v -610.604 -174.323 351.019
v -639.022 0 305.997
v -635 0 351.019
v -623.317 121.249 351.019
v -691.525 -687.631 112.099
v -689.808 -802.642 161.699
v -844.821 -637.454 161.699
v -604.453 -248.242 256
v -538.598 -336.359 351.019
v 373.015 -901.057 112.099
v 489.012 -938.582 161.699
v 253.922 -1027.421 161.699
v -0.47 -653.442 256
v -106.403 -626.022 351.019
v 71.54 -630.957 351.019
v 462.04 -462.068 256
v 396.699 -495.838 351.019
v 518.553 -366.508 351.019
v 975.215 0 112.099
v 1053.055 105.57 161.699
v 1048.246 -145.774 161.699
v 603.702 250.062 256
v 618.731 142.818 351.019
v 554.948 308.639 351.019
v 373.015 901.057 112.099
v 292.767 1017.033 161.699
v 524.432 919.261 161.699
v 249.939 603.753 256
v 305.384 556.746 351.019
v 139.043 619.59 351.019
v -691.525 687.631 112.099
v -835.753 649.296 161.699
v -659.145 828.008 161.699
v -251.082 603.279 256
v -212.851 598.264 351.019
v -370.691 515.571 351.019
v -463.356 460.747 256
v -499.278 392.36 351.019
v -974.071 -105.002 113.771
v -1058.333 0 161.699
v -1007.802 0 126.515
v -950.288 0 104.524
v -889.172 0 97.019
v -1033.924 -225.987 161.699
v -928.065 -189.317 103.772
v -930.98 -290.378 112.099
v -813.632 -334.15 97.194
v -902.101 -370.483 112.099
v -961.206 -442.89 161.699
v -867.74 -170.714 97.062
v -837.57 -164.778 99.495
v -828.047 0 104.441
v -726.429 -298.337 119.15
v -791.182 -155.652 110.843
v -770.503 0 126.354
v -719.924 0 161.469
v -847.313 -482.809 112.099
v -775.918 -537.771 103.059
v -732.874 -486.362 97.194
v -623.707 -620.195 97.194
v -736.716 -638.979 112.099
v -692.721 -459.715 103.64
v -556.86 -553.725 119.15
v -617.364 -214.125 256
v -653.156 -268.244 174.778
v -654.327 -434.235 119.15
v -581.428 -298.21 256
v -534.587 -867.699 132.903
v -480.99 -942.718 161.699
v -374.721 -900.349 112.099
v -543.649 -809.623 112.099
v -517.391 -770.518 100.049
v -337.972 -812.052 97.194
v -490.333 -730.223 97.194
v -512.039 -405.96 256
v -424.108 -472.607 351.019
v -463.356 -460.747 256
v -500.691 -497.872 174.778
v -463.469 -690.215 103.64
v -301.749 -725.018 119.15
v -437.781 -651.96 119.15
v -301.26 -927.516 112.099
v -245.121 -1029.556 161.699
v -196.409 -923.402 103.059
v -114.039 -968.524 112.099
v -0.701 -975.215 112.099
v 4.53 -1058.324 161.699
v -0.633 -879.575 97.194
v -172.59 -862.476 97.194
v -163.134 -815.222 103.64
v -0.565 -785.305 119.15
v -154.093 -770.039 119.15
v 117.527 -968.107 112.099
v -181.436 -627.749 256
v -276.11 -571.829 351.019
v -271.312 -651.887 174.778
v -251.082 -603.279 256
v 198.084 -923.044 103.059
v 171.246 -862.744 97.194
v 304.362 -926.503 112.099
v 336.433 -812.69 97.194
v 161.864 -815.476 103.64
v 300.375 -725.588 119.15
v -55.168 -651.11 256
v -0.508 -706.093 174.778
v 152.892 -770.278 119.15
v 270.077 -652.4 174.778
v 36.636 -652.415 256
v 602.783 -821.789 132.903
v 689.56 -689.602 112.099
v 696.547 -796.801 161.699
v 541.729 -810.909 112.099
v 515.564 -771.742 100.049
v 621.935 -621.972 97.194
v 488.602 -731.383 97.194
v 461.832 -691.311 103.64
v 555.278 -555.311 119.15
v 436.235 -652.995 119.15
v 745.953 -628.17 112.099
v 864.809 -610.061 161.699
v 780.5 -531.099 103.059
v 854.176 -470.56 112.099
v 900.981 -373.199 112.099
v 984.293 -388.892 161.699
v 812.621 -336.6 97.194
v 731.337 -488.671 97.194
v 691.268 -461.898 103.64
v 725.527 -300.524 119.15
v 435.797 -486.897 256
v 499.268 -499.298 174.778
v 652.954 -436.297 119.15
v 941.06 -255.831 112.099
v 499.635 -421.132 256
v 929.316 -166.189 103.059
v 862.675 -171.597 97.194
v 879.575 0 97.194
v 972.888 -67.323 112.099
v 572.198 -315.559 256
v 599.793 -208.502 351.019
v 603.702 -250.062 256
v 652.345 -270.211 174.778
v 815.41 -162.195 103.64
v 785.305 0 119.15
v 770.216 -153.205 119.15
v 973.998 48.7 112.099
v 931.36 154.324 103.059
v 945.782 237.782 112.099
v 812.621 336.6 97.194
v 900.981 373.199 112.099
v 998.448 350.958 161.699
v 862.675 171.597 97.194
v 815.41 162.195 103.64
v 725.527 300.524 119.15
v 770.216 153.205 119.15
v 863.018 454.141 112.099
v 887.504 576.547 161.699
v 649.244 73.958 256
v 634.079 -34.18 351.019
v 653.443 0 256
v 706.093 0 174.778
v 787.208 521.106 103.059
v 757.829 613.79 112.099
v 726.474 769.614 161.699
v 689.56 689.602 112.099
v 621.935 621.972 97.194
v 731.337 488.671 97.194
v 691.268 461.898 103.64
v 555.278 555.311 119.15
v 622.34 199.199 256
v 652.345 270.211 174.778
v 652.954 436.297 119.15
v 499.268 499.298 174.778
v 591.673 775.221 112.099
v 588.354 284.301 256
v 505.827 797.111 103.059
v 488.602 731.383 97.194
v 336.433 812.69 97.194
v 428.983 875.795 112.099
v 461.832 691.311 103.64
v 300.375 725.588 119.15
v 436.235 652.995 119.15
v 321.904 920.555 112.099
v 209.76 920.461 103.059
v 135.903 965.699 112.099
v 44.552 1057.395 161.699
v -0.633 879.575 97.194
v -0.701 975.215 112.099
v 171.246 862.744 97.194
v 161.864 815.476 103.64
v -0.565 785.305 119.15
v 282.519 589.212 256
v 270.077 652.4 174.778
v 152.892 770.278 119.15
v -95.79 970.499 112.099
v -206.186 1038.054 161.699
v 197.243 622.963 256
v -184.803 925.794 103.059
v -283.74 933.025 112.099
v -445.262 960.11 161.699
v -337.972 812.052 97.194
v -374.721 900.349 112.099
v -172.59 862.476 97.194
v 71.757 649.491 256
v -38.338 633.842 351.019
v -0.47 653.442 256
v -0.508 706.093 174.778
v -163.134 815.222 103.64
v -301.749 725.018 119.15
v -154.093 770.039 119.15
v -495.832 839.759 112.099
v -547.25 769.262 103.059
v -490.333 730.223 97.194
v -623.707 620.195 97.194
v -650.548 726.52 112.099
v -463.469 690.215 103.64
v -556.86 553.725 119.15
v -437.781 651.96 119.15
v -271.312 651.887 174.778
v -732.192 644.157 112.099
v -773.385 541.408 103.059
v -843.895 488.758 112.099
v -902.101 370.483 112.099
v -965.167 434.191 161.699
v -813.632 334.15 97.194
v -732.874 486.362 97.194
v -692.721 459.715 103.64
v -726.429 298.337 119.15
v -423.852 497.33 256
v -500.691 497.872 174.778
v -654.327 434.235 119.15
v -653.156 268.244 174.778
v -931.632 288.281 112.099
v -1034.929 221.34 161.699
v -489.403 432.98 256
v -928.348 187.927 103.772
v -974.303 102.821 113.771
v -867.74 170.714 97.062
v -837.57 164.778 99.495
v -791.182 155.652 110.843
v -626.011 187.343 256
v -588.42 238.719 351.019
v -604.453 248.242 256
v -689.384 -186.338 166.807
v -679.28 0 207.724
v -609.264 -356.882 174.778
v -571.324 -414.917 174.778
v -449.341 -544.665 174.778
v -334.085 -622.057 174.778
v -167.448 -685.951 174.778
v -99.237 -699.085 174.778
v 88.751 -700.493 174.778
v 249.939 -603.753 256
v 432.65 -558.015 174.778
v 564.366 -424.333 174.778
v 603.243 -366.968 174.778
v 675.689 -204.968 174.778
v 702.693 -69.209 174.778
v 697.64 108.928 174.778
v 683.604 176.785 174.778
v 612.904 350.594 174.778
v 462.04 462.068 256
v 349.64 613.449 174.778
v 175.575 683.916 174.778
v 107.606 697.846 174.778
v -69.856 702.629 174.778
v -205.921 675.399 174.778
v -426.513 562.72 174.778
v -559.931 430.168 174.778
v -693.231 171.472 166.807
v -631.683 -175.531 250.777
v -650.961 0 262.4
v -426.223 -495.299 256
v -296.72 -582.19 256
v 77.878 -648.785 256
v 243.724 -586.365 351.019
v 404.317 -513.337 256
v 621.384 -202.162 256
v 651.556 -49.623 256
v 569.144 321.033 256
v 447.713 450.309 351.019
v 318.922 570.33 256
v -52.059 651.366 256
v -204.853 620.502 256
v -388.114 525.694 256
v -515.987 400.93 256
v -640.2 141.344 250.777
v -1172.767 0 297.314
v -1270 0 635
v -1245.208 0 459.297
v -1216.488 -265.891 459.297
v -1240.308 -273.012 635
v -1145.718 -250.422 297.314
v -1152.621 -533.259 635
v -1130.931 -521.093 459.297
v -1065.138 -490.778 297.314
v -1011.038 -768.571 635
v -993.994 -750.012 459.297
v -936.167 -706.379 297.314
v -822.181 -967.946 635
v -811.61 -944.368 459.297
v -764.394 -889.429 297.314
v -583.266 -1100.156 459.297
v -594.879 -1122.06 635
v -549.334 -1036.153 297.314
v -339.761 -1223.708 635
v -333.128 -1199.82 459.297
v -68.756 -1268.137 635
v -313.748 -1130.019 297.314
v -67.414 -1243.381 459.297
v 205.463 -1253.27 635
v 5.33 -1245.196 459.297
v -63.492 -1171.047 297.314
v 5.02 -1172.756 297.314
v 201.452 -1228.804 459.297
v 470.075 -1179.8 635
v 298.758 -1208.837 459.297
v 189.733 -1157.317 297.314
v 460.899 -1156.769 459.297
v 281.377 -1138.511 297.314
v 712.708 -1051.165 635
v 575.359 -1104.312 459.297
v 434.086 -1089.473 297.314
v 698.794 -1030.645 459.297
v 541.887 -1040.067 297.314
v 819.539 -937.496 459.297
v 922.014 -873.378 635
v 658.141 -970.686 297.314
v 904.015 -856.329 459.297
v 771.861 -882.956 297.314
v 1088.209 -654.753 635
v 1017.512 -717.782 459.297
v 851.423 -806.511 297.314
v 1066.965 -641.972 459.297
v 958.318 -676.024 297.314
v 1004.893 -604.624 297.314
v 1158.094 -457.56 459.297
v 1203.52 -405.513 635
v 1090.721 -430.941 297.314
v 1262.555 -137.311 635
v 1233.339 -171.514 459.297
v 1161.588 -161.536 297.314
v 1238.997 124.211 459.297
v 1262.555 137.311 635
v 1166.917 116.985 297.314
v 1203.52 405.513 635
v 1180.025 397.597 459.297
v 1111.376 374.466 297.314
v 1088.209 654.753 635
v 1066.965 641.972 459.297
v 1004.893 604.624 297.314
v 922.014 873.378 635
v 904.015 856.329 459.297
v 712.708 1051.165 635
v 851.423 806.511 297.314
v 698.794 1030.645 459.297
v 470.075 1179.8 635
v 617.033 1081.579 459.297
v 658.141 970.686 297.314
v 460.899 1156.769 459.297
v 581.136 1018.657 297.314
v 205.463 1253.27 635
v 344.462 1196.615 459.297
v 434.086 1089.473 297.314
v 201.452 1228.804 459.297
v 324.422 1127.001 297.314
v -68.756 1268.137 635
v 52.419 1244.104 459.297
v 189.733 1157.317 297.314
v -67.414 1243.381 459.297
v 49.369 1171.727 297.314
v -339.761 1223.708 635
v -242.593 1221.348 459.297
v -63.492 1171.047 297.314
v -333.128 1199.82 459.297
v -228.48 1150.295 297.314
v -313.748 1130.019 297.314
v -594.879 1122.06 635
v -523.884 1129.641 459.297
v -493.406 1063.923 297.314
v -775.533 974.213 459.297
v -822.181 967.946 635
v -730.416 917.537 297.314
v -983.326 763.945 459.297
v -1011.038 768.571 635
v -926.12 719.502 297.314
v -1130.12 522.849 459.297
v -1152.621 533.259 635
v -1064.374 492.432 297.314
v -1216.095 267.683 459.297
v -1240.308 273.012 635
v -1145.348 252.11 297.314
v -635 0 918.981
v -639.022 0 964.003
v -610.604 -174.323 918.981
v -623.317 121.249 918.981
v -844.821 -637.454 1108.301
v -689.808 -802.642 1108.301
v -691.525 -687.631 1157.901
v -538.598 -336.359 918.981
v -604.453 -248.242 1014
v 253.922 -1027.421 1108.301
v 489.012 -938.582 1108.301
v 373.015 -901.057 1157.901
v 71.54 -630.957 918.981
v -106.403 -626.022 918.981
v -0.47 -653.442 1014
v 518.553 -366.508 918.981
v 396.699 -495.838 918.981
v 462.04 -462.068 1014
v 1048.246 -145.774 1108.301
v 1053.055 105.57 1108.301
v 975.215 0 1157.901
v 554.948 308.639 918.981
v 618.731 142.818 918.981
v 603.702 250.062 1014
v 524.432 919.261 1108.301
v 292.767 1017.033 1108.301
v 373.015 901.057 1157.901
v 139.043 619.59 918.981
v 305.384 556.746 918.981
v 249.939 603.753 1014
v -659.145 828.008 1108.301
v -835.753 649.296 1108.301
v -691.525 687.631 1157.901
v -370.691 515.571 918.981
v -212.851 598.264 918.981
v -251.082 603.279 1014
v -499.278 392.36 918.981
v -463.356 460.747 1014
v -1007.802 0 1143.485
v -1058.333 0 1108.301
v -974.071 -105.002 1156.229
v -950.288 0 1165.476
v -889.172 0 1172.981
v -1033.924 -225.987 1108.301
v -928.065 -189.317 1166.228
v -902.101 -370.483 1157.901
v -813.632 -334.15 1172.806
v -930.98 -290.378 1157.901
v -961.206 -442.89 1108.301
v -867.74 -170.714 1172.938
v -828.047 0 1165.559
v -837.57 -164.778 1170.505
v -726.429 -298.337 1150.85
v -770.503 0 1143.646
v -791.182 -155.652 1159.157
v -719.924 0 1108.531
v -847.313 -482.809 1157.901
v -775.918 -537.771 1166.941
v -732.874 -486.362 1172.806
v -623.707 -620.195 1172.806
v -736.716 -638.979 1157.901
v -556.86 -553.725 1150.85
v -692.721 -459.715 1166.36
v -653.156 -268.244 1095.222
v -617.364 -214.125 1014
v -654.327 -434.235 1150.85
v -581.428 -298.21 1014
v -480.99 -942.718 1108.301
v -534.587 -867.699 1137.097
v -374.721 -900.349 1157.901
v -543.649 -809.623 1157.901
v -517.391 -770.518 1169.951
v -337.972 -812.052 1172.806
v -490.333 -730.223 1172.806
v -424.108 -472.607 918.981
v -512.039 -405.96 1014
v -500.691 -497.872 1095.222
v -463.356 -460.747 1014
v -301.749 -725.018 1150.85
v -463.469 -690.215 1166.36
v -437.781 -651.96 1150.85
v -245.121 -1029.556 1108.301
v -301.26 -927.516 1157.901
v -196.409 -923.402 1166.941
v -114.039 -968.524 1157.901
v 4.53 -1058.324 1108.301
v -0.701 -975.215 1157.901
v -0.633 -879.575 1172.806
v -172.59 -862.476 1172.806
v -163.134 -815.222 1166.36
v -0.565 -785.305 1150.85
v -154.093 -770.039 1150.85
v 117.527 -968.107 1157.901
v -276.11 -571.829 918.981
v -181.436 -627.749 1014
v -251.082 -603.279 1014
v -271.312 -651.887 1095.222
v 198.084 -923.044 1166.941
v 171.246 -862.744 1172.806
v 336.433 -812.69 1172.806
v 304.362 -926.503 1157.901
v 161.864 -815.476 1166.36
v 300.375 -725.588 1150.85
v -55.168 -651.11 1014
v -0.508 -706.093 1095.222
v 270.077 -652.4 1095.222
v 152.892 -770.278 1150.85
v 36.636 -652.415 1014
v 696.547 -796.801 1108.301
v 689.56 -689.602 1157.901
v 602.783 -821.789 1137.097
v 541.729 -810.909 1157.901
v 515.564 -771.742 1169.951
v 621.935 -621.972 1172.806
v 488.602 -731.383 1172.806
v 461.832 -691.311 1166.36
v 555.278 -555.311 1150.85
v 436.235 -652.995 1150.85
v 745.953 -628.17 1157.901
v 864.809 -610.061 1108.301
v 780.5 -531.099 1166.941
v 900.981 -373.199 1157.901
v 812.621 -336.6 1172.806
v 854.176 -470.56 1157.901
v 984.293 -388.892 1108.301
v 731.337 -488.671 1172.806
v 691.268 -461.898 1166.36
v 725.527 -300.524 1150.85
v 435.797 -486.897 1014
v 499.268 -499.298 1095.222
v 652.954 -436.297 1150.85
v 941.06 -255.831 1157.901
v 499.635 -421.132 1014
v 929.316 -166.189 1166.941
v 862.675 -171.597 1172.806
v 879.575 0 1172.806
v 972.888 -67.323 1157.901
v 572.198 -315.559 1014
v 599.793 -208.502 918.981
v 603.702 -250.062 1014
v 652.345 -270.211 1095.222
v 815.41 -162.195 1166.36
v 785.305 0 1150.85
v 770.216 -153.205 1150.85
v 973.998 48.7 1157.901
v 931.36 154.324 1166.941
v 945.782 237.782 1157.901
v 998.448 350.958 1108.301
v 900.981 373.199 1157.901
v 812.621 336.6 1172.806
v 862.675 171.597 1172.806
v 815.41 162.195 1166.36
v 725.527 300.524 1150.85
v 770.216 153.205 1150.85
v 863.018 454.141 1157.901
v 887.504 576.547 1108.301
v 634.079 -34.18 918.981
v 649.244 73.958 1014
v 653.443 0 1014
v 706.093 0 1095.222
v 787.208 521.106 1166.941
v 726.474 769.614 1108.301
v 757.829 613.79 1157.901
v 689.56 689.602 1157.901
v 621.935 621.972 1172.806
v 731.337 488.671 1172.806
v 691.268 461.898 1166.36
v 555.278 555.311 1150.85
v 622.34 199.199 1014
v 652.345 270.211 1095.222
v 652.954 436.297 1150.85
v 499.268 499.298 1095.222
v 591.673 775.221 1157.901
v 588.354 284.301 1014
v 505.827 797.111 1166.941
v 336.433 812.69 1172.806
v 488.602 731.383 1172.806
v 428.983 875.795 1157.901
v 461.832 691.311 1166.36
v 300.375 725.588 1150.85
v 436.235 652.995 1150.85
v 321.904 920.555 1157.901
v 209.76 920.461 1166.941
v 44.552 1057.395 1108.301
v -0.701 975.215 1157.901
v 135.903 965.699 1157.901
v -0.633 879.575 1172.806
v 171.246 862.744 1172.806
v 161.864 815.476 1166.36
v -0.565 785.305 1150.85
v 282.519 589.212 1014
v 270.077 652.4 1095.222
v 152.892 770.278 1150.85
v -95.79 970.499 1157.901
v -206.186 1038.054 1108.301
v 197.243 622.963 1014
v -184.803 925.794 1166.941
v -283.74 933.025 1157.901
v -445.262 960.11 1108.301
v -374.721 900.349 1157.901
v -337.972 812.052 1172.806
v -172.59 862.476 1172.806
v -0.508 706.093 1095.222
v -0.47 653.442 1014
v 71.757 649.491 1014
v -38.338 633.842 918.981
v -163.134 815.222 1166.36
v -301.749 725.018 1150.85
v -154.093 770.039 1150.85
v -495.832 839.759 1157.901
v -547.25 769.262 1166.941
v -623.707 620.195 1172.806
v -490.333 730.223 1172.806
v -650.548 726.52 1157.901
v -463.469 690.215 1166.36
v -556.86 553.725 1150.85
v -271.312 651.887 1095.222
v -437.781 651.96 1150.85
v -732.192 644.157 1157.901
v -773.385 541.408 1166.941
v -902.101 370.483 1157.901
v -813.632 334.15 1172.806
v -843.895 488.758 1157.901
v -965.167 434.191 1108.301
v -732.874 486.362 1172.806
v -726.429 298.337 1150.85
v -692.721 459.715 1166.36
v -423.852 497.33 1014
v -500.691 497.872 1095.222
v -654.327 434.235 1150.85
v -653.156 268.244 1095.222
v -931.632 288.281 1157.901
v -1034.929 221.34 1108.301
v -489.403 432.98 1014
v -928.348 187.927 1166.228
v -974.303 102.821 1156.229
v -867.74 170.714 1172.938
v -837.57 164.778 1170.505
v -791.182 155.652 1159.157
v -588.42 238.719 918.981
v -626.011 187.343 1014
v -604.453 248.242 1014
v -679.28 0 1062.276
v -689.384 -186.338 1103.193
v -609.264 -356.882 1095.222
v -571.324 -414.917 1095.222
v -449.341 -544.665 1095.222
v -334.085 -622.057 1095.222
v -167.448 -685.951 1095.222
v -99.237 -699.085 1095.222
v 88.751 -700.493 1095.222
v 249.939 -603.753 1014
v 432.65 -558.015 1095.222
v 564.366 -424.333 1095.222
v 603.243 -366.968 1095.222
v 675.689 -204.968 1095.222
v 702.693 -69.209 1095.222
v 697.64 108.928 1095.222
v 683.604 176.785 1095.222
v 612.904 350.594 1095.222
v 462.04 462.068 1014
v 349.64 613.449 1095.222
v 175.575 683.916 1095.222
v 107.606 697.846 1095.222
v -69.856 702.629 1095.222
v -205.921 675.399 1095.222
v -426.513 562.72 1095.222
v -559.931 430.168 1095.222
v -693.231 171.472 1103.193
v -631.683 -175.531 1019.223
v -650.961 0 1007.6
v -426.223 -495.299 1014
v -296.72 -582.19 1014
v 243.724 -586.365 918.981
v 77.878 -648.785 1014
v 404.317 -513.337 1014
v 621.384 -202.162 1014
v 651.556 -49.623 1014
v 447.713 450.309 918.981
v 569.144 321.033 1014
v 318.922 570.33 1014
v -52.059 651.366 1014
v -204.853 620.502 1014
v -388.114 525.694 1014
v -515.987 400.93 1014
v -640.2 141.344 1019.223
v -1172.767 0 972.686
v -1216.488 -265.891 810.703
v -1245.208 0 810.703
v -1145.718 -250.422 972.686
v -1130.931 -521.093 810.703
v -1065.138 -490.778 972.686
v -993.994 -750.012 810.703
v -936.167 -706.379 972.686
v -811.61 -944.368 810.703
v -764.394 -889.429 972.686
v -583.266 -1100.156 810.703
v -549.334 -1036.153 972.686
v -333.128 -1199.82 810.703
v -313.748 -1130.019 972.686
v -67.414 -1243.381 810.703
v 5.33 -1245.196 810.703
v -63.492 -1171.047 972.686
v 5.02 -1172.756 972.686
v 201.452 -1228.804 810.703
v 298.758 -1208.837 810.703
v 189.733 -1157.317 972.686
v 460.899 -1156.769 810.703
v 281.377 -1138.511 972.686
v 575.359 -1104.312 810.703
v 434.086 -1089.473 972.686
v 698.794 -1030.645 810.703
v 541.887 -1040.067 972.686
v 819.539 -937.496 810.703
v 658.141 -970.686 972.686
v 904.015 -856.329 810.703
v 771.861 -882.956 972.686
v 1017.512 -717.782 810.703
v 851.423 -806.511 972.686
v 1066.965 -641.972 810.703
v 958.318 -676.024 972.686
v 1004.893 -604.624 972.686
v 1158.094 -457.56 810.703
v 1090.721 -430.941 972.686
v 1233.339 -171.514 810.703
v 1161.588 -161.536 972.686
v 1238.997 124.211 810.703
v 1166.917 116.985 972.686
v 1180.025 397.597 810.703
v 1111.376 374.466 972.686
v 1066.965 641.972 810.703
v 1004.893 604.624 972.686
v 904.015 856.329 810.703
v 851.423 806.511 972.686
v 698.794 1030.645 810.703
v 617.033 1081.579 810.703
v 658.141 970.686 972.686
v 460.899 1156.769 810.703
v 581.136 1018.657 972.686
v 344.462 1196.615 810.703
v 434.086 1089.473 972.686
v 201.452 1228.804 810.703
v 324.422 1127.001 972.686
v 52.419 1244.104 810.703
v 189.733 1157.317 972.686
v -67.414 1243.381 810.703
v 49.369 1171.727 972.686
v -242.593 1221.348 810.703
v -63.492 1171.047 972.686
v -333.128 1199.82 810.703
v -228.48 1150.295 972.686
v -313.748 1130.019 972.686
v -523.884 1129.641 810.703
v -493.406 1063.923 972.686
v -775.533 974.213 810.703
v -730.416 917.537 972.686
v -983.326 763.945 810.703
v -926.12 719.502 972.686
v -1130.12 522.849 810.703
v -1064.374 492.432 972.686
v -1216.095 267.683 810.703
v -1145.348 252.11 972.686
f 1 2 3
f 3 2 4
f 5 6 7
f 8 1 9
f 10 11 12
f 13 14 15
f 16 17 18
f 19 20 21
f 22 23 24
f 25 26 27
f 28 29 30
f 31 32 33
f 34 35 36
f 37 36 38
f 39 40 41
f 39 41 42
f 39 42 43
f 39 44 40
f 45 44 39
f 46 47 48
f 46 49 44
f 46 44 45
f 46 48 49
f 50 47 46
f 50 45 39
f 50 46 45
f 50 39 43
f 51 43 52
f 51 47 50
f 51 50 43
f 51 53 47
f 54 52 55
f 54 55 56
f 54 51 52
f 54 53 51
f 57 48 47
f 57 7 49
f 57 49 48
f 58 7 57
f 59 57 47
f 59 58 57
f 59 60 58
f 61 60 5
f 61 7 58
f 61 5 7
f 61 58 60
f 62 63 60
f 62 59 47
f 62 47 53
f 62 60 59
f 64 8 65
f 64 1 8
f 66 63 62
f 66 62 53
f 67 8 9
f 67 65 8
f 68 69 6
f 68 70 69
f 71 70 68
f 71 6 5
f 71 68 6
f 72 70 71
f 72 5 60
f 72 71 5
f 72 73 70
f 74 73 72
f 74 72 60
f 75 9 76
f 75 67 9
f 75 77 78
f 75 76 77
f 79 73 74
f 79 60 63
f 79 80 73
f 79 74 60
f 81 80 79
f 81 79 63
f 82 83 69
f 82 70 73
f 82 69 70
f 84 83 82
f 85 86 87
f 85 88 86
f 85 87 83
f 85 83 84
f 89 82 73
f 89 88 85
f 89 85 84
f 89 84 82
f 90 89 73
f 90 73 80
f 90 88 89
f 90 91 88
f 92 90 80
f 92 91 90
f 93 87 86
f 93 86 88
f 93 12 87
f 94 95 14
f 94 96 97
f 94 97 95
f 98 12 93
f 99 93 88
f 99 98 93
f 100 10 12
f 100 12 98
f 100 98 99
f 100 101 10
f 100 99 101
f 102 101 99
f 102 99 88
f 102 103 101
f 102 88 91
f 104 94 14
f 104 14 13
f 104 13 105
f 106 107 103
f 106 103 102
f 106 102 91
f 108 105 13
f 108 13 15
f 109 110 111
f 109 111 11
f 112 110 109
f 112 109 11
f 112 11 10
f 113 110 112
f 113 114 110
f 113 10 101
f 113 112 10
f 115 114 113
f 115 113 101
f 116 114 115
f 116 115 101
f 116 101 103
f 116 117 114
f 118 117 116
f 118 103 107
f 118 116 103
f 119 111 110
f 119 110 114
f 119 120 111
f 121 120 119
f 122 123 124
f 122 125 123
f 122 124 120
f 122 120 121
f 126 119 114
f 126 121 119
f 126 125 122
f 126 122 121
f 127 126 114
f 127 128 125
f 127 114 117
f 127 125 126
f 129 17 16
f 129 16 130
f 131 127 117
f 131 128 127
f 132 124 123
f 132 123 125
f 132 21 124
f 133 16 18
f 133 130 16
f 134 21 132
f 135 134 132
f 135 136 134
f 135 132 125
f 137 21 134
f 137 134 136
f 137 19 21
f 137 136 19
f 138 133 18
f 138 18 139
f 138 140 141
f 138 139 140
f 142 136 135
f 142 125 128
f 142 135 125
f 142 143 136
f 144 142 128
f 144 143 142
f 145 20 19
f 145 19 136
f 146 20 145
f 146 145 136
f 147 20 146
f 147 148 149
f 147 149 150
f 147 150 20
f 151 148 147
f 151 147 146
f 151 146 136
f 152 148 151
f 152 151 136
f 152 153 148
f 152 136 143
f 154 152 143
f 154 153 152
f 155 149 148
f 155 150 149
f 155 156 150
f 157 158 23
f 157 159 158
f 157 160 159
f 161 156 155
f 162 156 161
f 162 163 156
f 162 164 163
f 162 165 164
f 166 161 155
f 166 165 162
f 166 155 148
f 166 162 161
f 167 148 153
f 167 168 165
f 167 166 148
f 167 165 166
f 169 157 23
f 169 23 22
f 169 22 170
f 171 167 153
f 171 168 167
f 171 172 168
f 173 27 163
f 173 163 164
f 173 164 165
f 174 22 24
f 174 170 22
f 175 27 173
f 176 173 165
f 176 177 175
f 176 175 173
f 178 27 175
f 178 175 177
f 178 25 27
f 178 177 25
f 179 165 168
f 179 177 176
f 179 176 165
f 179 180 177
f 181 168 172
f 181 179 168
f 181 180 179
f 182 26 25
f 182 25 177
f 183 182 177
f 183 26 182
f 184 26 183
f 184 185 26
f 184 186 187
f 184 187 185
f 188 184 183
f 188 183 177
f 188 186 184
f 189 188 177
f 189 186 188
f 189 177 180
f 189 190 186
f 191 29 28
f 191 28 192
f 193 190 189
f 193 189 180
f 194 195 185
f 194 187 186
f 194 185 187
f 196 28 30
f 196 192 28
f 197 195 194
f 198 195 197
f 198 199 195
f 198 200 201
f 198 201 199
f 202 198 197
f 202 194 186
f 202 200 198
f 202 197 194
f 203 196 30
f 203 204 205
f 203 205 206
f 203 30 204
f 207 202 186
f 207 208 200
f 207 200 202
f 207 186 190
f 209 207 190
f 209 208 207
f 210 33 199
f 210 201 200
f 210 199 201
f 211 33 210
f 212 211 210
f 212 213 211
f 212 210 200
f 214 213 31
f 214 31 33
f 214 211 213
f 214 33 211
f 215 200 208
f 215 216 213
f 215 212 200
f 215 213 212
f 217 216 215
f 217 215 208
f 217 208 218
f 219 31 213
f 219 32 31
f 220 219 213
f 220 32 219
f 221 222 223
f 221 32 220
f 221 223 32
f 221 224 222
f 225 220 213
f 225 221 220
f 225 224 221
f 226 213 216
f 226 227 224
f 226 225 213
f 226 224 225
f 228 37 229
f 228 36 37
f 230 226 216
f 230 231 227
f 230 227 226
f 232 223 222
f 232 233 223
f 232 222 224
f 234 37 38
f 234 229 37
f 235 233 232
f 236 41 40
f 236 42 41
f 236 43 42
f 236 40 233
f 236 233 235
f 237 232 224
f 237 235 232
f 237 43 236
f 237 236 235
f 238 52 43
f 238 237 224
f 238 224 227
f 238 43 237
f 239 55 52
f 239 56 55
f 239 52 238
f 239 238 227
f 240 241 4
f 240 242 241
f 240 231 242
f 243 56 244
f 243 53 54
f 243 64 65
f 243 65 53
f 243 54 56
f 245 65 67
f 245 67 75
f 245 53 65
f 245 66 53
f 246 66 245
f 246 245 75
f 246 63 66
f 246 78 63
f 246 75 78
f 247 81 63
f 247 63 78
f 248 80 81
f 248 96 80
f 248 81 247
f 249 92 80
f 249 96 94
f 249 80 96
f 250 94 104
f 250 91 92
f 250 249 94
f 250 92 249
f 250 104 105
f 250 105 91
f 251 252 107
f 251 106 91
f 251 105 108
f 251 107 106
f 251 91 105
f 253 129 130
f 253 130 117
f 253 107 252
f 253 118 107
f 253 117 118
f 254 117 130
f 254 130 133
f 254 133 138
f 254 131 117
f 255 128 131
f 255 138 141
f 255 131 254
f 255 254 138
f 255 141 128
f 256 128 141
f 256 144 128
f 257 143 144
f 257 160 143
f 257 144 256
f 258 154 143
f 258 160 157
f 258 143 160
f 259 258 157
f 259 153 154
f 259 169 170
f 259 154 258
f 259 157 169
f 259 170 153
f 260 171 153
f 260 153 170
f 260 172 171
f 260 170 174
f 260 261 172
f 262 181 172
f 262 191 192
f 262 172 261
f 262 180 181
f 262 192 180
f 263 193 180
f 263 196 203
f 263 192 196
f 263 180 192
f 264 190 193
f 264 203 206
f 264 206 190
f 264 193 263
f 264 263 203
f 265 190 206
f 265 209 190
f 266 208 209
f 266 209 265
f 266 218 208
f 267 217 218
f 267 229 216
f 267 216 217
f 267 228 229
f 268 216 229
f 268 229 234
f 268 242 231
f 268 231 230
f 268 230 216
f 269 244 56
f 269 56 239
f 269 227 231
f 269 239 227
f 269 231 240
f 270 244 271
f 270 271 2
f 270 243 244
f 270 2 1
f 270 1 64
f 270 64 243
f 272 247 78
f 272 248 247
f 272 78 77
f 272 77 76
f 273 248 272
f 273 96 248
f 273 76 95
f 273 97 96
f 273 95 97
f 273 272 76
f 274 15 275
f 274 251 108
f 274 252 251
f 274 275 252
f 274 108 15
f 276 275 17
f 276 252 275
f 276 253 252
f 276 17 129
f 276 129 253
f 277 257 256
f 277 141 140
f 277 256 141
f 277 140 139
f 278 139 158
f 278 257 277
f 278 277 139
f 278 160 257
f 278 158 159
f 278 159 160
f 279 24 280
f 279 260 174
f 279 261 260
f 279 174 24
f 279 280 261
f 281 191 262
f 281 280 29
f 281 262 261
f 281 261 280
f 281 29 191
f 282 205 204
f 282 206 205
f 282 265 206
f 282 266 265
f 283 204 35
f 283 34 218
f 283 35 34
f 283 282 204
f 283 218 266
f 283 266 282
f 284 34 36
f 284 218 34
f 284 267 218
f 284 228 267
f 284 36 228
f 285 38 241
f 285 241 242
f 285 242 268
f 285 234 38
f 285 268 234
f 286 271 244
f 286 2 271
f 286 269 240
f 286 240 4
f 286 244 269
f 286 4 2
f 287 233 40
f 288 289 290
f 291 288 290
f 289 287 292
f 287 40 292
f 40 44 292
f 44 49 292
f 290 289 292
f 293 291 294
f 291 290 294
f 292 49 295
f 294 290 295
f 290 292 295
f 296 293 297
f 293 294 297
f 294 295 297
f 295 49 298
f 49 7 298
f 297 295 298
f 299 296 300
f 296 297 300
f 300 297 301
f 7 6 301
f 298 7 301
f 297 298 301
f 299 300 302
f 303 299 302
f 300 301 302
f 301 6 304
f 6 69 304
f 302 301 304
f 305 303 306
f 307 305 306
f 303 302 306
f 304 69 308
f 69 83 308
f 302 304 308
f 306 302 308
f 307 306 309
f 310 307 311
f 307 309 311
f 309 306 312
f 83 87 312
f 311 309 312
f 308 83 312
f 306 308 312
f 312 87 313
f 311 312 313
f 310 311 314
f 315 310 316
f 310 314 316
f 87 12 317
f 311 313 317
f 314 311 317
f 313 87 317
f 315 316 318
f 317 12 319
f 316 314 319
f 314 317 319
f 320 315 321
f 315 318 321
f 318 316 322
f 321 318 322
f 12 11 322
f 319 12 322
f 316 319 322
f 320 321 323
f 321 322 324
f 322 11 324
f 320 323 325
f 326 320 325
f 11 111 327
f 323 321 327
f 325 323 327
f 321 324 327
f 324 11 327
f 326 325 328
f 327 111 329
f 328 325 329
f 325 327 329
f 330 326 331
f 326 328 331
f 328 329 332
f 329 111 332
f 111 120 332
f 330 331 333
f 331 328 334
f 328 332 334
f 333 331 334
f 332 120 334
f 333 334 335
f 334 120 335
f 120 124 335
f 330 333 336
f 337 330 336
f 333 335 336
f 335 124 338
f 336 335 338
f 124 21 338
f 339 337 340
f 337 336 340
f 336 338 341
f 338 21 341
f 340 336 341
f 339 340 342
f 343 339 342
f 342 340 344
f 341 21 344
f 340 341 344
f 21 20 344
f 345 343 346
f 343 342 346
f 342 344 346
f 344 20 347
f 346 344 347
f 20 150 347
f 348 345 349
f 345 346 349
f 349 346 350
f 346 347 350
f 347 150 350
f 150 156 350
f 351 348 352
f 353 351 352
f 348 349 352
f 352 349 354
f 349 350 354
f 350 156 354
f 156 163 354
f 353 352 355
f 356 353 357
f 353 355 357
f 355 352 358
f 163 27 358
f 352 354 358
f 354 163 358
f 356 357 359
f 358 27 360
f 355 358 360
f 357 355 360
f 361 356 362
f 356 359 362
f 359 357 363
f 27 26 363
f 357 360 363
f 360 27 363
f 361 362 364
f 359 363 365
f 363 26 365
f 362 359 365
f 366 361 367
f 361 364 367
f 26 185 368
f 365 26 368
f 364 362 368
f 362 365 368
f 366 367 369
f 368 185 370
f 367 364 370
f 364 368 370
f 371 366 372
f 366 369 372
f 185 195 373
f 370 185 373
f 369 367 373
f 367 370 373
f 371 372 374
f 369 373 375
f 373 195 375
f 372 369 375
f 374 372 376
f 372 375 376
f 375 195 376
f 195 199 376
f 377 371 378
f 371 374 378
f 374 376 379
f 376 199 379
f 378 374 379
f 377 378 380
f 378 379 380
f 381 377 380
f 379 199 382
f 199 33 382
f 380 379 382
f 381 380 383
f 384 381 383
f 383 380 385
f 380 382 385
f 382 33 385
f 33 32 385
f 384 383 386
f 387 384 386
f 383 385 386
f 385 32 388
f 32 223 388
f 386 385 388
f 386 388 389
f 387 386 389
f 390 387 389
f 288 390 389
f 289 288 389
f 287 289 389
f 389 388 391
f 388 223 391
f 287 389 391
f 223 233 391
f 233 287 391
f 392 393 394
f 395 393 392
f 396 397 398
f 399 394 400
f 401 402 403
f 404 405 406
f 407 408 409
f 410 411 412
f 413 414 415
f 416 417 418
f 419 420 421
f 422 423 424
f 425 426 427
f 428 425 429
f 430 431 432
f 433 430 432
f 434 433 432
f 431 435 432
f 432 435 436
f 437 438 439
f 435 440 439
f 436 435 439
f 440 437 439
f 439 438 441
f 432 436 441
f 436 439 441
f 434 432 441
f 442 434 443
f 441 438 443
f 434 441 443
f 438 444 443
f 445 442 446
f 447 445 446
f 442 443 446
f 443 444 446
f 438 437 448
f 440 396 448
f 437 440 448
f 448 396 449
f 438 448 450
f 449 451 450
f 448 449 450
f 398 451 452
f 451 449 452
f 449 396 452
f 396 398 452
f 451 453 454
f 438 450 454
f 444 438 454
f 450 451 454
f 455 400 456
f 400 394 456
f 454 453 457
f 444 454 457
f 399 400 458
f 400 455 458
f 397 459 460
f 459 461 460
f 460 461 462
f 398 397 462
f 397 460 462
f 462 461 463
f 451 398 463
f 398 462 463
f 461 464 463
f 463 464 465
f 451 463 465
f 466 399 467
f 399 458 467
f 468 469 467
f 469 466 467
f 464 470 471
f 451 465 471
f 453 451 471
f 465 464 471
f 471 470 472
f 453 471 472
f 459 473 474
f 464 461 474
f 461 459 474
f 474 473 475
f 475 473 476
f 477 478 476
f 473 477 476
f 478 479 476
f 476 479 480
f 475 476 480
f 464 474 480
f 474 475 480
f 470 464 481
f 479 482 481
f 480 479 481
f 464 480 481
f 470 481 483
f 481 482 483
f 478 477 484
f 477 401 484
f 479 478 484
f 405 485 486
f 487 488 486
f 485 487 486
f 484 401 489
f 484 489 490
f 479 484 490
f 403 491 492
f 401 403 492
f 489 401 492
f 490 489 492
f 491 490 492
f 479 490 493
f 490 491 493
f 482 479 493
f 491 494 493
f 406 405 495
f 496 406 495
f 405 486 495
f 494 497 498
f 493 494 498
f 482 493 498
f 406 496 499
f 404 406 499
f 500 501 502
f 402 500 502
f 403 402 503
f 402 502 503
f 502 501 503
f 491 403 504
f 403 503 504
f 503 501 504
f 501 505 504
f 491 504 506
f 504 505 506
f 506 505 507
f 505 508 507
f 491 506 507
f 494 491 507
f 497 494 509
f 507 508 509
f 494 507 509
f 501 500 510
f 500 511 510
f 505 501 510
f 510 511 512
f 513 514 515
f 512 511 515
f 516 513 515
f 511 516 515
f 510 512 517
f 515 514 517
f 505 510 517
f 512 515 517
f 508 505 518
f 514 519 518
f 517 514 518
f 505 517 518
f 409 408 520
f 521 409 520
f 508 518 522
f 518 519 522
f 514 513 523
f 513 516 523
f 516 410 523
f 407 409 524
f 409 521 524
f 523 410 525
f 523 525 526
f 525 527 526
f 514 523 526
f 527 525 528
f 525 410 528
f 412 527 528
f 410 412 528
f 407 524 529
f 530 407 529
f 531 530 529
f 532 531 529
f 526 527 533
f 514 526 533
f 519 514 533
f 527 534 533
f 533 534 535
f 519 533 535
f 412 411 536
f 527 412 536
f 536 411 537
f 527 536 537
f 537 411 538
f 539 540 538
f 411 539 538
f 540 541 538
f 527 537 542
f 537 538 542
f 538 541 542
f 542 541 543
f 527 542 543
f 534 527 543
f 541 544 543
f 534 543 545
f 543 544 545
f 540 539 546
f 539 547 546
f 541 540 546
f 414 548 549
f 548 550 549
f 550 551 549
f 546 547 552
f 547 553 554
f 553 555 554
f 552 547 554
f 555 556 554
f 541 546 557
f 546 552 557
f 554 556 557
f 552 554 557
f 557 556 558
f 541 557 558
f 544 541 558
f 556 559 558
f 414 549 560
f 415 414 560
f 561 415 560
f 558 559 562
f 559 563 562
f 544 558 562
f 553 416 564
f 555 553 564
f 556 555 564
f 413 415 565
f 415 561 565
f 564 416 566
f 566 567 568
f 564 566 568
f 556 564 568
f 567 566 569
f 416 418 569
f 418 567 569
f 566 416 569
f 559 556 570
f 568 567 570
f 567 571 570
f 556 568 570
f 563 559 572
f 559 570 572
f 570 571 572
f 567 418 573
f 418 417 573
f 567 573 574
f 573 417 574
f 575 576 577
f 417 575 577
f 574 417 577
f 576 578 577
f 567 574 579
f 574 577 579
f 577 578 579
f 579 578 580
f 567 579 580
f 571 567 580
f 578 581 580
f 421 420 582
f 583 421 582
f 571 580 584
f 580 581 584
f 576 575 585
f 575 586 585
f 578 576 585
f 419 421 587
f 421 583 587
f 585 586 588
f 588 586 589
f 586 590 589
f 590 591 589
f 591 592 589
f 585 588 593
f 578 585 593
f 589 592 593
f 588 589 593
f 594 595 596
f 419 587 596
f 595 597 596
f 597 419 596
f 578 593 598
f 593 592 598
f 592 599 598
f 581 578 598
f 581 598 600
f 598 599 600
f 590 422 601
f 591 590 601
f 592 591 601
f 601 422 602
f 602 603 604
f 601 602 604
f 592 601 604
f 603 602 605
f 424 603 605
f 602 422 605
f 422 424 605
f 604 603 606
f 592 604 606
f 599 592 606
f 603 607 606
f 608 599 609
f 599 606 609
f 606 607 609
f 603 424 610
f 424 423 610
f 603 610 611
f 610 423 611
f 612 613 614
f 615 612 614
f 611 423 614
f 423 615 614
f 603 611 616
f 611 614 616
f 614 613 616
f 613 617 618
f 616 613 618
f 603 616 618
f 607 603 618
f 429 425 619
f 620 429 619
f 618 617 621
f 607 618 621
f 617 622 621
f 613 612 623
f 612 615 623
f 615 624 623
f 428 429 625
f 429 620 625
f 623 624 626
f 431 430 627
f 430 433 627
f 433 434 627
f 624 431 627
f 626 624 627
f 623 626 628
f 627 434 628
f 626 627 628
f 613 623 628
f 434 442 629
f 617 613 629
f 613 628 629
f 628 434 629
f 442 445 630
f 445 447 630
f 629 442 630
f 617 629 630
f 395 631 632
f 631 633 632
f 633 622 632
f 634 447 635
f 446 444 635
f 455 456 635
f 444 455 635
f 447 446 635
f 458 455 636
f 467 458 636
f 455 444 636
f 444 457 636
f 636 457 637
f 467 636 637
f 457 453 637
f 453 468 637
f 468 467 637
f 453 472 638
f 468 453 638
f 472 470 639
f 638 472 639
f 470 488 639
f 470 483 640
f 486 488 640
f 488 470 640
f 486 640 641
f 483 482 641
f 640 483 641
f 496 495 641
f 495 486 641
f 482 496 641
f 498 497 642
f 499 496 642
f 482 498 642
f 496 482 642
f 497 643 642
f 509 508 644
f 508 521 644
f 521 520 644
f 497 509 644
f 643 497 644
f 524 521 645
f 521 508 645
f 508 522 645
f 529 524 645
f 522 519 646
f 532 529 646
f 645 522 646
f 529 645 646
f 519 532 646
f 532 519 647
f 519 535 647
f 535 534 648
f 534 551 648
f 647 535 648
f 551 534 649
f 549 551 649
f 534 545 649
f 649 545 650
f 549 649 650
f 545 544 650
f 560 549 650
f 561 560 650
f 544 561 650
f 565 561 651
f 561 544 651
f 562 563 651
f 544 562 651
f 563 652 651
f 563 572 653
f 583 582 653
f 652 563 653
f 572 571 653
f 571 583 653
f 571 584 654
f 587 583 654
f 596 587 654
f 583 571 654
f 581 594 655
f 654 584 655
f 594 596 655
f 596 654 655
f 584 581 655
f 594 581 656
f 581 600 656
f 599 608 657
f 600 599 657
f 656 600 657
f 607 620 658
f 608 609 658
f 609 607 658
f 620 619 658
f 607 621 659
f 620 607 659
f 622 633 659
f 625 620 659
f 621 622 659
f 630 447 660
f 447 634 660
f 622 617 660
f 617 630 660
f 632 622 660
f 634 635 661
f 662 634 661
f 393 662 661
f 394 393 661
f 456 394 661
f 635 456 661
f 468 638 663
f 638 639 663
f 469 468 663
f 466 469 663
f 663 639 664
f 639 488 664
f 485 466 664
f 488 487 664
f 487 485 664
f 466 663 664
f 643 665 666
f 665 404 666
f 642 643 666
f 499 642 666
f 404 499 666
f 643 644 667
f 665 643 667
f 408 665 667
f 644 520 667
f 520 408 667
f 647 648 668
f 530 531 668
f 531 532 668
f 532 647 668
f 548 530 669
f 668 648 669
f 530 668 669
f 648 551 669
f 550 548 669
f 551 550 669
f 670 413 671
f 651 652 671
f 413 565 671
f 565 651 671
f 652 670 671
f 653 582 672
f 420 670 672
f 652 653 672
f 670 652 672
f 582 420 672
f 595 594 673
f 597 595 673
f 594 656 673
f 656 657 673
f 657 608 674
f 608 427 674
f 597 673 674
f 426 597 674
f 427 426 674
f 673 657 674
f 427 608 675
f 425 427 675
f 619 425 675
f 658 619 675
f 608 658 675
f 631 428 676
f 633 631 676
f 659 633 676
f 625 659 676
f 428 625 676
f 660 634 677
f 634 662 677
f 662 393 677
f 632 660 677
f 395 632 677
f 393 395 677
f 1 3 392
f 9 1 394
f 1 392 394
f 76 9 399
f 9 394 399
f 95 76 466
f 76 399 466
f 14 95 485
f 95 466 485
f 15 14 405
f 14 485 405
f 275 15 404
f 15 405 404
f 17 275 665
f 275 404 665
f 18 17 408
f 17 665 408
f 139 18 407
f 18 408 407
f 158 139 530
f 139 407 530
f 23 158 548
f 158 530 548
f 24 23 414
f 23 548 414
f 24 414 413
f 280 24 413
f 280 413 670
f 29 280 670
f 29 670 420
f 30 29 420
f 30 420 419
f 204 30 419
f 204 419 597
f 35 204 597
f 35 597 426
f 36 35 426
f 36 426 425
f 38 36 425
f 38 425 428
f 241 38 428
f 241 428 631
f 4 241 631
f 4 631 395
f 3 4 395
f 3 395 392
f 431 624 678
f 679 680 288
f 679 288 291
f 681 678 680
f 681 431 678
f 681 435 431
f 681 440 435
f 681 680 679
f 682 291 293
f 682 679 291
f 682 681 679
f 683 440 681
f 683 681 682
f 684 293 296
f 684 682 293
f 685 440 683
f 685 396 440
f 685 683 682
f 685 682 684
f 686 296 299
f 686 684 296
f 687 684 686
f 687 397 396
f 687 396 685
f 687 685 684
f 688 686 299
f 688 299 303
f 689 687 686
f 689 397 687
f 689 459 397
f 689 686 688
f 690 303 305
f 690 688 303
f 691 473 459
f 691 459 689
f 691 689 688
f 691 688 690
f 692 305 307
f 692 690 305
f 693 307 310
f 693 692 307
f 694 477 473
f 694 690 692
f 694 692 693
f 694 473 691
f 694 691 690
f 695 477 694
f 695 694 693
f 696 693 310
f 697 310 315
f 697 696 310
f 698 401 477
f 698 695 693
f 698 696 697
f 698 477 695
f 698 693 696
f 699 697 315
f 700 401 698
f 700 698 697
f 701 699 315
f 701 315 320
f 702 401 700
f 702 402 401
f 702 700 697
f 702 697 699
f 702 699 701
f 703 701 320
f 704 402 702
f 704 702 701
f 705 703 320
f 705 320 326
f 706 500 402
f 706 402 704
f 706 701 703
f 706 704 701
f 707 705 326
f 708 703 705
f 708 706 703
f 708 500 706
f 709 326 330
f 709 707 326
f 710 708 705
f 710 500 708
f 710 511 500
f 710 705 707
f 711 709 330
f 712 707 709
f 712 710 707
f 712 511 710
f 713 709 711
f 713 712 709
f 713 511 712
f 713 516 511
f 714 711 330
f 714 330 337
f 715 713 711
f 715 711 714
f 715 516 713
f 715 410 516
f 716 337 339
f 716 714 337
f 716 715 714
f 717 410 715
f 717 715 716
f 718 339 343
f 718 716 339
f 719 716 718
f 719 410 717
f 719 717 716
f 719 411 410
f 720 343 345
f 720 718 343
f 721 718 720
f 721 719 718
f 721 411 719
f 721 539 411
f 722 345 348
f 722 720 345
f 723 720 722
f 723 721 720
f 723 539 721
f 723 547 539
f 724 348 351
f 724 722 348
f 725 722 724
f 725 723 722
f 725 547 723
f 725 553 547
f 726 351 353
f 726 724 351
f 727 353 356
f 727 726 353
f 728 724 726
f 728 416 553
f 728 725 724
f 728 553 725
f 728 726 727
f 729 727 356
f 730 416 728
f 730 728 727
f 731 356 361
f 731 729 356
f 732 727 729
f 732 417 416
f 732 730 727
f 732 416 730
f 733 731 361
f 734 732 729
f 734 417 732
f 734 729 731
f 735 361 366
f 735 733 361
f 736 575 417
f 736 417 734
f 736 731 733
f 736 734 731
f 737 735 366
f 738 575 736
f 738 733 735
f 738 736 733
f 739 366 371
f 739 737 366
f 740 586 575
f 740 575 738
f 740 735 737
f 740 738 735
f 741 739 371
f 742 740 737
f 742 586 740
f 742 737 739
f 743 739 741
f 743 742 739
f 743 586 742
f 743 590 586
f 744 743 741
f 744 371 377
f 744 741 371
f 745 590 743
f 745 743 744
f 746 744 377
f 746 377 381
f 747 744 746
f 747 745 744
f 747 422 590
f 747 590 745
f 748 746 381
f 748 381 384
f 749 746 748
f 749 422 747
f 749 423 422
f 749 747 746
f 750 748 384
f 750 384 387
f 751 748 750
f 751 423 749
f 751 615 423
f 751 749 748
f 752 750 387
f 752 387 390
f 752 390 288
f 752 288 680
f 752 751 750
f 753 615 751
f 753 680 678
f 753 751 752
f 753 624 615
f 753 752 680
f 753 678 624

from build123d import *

# Parameters (mm, degrees)
F0_W     = 1270
F0_H     = 1270
F2_R     = 634.99999
F3_DEPTH = 1270.001
F4_R     = 254


# Not quite as in the source:
# - a fillet or chamfer is up to 0.001 mm smaller than in the source, because OpenCascade refuses the exact size


with BuildPart() as f1:
    # F0 (on Front) → F1 (revolve)
    with BuildSketch(Plane.XZ):
        with Locations((-635, 635)):
            Rectangle(F0_W, F0_H)
    revolve(axis=Axis((0, 0, 635), (0, 0, 1)))

    # F2 (radius 635 in the source; OpenCascade refuses exactly that, so slightly less here)
    f2_edges = [f1.edges().sort_by_distance(p)[0] for p in [
        (1270, 0, 1270),
        (1270, 0, 0),
        (-1270, 0, 635),
    ]]
    fillet(f2_edges, radius=F2_R)

    # F3 (cut, through all): a face of the model
    f3_faces = [f1.faces().sort_by_distance(p)[0] for p in [
        (0, 0, 1270),
    ]]
    extrude(f3_faces, amount=-F3_DEPTH, mode=Mode.SUBTRACT)

    # F4
    f4_edges = [f1.edges().sort_by_distance(p)[0] for p in [
        (635.00001, 0, 1270),
        (635.00001, 0, 0),
    ]]
    fillet(f4_edges, radius=F4_R)


solid = f1.part
